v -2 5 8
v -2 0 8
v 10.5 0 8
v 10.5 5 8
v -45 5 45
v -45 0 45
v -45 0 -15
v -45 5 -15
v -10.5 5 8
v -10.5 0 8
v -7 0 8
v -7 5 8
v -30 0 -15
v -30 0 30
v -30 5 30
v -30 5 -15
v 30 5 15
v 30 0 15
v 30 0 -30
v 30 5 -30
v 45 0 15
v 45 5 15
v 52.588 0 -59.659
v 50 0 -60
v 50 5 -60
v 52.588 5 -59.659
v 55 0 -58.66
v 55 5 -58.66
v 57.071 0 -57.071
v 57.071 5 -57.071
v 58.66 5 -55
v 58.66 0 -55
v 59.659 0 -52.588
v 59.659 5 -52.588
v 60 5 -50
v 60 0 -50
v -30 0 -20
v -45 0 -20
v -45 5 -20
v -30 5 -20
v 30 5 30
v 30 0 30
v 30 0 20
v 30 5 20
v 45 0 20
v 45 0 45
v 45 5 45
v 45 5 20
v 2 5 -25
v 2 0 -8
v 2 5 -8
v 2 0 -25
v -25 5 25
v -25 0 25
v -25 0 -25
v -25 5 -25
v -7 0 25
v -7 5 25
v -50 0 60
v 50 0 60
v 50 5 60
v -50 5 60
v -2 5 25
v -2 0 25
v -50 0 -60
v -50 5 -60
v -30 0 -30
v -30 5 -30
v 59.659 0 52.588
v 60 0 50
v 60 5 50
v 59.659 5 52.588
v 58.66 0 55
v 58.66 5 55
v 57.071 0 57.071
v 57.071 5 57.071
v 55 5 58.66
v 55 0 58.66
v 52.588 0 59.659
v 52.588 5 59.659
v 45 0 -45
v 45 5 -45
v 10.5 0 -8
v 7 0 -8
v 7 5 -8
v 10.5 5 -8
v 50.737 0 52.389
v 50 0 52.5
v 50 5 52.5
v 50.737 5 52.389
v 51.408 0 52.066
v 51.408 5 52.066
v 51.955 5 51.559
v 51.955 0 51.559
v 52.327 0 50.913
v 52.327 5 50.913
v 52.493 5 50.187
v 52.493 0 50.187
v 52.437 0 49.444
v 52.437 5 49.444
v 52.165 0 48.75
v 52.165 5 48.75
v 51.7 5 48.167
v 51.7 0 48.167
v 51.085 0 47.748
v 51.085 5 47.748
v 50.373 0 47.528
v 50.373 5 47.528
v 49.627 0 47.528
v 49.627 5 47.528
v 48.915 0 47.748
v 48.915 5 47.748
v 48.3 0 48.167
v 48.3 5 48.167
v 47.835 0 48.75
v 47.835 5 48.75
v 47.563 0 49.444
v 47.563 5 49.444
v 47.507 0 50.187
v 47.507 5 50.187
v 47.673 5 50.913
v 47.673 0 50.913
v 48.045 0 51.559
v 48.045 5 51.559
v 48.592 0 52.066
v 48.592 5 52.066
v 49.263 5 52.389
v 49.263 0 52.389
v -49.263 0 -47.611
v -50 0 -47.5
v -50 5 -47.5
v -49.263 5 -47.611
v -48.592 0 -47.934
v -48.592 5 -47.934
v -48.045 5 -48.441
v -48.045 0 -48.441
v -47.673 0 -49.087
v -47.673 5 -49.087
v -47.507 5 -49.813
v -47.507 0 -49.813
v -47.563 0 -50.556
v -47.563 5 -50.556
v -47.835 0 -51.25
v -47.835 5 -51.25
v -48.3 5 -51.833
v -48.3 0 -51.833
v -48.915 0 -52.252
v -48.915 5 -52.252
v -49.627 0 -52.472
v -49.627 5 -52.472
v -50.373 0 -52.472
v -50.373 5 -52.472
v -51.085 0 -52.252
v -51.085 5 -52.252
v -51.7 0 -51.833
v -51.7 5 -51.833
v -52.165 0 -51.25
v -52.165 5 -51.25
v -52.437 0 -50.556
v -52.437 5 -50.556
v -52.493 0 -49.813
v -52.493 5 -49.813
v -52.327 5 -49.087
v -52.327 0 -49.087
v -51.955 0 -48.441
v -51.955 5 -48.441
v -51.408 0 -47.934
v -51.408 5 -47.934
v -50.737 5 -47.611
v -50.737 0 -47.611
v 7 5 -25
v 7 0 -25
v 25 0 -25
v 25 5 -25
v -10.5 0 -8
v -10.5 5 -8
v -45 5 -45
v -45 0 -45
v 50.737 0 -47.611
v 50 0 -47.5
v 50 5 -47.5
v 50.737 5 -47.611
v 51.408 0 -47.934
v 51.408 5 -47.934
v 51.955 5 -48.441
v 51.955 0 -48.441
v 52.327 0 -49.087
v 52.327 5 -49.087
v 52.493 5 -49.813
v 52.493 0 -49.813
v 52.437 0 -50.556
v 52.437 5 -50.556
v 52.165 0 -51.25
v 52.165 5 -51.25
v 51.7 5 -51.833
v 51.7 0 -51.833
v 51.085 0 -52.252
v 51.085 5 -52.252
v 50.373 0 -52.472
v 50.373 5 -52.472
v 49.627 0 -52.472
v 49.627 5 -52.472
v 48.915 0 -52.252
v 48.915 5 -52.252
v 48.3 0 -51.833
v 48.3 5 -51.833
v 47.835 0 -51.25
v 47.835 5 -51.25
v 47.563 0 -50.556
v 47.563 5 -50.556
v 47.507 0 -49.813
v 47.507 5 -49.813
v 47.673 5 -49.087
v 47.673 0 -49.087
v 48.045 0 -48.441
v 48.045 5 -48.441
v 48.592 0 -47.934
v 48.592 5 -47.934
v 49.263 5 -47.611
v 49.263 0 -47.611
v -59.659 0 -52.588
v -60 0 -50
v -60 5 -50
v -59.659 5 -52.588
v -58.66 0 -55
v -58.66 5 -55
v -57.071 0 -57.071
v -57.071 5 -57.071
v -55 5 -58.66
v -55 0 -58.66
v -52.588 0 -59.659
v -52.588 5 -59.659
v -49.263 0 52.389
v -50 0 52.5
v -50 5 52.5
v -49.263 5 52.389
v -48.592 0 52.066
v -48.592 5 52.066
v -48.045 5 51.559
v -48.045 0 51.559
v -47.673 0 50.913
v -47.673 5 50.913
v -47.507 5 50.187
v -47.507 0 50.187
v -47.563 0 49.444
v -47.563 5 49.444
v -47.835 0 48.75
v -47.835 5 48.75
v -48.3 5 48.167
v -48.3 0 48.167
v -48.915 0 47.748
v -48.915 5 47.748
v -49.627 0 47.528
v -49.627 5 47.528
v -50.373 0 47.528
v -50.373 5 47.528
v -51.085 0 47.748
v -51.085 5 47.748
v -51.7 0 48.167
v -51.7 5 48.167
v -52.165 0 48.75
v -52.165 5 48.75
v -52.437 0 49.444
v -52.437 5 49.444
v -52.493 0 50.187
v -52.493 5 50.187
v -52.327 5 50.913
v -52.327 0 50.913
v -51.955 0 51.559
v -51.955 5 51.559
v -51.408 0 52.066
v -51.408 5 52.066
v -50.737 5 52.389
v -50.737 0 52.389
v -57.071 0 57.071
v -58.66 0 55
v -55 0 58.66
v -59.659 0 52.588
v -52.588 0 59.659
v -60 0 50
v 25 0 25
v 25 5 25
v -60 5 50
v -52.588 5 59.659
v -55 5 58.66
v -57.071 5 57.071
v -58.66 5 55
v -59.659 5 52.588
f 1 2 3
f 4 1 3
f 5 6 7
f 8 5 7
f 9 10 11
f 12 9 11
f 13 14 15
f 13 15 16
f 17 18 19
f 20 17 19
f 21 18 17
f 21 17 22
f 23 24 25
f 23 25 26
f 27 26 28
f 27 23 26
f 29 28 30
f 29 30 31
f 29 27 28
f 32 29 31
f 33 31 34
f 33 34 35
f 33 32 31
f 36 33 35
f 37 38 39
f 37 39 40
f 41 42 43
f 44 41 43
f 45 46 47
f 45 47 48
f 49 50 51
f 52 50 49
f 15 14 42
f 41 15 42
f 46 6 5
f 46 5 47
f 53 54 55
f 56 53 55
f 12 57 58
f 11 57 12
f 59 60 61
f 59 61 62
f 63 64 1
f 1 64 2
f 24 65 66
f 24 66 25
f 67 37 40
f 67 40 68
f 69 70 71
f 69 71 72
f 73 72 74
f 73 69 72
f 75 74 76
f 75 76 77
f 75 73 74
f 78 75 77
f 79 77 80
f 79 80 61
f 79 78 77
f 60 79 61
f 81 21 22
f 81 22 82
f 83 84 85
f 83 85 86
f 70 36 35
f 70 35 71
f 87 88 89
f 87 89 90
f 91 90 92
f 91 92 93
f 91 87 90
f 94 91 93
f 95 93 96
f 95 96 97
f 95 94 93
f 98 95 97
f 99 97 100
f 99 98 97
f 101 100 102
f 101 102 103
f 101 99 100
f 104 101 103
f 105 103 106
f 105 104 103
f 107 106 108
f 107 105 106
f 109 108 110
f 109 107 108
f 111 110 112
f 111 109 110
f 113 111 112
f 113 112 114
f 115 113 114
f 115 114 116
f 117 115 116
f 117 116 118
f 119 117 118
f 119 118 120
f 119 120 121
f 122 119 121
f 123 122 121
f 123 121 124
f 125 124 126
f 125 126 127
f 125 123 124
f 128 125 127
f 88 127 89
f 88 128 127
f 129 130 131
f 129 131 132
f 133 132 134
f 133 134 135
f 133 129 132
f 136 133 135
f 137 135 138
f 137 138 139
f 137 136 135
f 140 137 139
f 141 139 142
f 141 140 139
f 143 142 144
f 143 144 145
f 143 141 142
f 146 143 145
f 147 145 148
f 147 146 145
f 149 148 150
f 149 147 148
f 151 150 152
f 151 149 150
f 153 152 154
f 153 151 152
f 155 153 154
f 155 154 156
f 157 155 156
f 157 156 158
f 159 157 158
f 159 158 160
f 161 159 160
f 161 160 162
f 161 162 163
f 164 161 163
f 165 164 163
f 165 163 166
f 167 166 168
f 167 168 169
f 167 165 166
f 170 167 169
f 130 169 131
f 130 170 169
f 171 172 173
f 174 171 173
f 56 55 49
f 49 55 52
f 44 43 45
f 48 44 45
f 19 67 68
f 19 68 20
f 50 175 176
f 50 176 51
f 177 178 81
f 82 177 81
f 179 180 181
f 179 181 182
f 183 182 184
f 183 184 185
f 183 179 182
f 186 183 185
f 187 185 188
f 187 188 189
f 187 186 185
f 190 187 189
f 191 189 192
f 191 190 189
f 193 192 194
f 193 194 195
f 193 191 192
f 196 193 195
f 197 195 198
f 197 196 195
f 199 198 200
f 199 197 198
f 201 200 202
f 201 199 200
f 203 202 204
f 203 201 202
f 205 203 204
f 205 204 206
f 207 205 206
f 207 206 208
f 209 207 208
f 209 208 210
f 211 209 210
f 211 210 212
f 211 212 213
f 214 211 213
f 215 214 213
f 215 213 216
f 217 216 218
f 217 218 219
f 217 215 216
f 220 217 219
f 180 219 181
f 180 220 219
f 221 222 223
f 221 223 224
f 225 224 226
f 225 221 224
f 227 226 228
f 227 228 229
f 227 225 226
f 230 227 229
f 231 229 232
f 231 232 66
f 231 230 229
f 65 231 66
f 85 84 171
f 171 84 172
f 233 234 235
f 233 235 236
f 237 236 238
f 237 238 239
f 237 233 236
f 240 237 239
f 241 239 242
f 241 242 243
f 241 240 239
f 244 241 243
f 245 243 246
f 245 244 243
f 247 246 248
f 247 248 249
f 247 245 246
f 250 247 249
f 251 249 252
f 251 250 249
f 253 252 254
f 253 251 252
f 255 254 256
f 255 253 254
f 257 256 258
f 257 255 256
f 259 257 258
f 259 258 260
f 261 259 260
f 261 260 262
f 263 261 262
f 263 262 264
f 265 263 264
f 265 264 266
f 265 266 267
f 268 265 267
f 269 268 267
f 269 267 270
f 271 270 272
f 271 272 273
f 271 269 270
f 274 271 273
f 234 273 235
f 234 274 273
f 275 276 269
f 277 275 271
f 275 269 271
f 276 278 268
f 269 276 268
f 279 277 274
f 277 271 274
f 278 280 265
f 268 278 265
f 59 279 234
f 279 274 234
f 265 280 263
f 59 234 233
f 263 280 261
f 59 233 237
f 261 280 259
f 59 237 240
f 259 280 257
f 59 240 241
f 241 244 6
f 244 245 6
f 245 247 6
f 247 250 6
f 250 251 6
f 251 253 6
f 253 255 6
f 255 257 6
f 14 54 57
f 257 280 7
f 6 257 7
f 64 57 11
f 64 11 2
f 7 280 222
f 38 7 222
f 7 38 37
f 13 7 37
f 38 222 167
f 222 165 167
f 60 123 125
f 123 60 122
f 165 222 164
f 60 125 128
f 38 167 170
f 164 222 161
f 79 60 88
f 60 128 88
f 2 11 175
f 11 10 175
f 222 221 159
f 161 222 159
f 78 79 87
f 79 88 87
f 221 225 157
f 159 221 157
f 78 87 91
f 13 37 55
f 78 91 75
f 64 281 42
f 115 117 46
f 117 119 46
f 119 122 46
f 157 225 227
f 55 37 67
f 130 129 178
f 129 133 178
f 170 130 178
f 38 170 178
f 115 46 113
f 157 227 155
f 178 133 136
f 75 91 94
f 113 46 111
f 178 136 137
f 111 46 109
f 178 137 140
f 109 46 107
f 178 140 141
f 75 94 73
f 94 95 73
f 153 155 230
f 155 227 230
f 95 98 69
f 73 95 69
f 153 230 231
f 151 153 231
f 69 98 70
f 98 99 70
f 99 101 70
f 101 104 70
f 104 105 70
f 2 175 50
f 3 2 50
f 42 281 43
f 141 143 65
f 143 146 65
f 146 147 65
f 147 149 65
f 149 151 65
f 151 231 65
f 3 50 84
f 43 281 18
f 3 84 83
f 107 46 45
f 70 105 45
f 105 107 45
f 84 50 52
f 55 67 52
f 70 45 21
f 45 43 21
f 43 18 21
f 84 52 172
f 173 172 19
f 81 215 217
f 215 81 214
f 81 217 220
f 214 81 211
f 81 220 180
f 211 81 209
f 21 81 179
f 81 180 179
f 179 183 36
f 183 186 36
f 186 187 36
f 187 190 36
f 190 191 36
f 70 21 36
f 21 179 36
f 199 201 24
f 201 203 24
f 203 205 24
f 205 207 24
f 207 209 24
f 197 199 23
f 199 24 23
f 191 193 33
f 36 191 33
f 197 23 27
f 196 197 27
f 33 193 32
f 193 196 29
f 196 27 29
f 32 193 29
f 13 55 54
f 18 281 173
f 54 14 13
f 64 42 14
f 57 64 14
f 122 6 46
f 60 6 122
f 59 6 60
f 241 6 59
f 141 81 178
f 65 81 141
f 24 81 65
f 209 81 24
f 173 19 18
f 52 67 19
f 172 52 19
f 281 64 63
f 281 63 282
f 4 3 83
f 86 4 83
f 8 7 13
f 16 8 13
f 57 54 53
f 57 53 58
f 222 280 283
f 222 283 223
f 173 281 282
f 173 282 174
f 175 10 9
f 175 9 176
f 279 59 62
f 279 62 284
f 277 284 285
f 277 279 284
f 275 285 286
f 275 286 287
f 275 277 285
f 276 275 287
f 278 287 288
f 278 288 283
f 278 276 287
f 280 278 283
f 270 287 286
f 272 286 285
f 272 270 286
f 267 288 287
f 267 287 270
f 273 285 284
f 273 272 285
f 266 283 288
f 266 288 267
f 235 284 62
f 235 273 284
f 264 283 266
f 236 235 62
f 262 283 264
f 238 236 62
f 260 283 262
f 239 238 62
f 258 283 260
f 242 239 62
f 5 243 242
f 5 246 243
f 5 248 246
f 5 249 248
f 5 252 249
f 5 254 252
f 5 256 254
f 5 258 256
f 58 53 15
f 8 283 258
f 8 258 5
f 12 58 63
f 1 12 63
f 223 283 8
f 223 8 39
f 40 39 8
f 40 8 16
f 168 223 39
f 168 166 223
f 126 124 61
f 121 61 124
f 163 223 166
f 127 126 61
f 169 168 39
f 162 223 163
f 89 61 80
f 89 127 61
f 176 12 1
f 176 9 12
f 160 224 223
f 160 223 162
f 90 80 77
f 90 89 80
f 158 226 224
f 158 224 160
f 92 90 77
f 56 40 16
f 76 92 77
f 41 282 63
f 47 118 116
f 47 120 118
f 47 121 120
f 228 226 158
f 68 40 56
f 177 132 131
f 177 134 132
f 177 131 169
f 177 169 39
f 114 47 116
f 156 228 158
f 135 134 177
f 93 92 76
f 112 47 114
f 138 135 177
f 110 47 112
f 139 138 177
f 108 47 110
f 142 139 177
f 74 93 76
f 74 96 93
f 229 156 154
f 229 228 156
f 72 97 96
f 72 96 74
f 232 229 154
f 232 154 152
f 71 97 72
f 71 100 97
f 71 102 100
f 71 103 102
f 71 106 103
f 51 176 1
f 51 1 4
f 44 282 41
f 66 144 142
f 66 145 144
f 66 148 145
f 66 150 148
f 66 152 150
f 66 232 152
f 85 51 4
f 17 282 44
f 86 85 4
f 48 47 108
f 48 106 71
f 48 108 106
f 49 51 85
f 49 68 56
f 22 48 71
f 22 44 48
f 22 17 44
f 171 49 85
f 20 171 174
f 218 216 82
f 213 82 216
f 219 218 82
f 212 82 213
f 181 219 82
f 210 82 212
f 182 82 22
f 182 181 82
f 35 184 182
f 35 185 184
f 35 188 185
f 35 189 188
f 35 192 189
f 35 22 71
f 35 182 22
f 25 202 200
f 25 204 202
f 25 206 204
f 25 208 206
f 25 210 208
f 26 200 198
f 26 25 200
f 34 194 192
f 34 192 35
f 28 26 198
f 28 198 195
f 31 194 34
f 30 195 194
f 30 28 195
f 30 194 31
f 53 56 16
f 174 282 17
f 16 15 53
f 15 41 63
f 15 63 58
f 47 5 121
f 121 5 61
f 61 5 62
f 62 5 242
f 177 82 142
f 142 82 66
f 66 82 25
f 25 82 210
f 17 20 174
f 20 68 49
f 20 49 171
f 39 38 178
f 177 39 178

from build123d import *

# Parameters (mm, degrees)
SKETCH1_R             = 2.5
SKETCH1_W             = 90
SKETCH1_H             = 90
BOSS_EXTRUDE1_DEPTH   = 5
SKETCH1_W_2           = 60
SKETCH1_H_2           = 60
SKETCH1_W_3           = 50
SKETCH1_H_3           = 50
BOSS_EXTRUDE1_2_DEPTH = 5
SKETCH1_W_4           = 21
SKETCH1_H_4           = 16
BOSS_EXTRUDE1_3_DEPTH = 5
SKETCH2_W             = 5
SKETCH2_H             = 17
SKETCH2_W_2           = 15
SKETCH2_H_2           = 5
BOSS_EXTRUDE2_DEPTH   = 5


with BuildPart() as part:
    # Sketch1 → Boss-Extrude1 (new body)
    with BuildSketch(Plane(origin=(0, 0, 0), x_dir=(1, 0, 0), z_dir=(0, 1, 0))):
        with BuildLine():
            ThreePointArc((-60, 50), (-57.071067812, 57.071067812), (-50, 60))
            Line((-50, 60), (50, 60))
            ThreePointArc((50, 60), (57.071067812, 57.071067812), (60, 50))
            Line((60, 50), (60, -50))
            ThreePointArc((60, -50), (57.071067812, -57.071067812), (50, -60))
            Line((50, -60), (-50, -60))
            ThreePointArc((-50, -60), (-57.071067812, -57.071067812), (-60, -50))
            Line((-60, -50), (-60, 50))
        make_face()
        with Locations(Location((-50, -50, 0), (0, 0, 270))):
            Circle(SKETCH1_R, mode=Mode.SUBTRACT)
        with Locations(Location((50, -50, 0), (0, 0, 270))):
            Circle(SKETCH1_R, mode=Mode.SUBTRACT)
        with Locations(Location((50, 50, 0), (0, 0, 270))):
            Circle(SKETCH1_R, mode=Mode.SUBTRACT)
        with Locations(Location((-50, 50, 0), (0, 0, 270))):
            Circle(SKETCH1_R, mode=Mode.SUBTRACT)
        Rectangle(SKETCH1_W, SKETCH1_H, mode=Mode.SUBTRACT)
    extrude(amount=BOSS_EXTRUDE1_DEPTH)



with BuildPart() as body_2:
    # Sketch1 → Boss-Extrude1 2 (new body)
    with BuildSketch(Plane(origin=(0, 0, 0), x_dir=(1, 0, 0), z_dir=(0, 1, 0))):
        Rectangle(SKETCH1_W_2, SKETCH1_H_2)
        Rectangle(SKETCH1_W_3, SKETCH1_H_3, mode=Mode.SUBTRACT)
    extrude(amount=BOSS_EXTRUDE1_2_DEPTH)


with BuildPart() as body_3:
    # Sketch1 → Boss-Extrude1 3 (new body)
    with BuildSketch(Plane(origin=(0, 0, 0), x_dir=(1, 0, 0), z_dir=(0, 1, 0))):
        Rectangle(SKETCH1_W_4, SKETCH1_H_4)
    extrude(amount=BOSS_EXTRUDE1_3_DEPTH)


with BuildPart() as part_1:
    add(part.part)

    add(body_2.part)  # Boss-Extrude2 merges body 2

    add(body_3.part)  # Boss-Extrude2 merges body 3
    # Sketch2 → Boss-Extrude2 (add)
    with BuildSketch(Plane(origin=(0, 0, 0), x_dir=(1, 0, 0), z_dir=(0, 1, 0))):
        with Locations((-4.5, -16.5)):
            Rectangle(SKETCH2_W, SKETCH2_H)
        with Locations((4.5, 16.5)):
            Rectangle(SKETCH2_W, SKETCH2_H)
        with Locations((-37.5, 17.5)):
            Rectangle(SKETCH2_W_2, SKETCH2_H_2)
        with Locations((37.5, -17.5)):
            Rectangle(SKETCH2_W_2, SKETCH2_H_2)
    extrude(amount=BOSS_EXTRUDE2_DEPTH)


solid = part_1.part
